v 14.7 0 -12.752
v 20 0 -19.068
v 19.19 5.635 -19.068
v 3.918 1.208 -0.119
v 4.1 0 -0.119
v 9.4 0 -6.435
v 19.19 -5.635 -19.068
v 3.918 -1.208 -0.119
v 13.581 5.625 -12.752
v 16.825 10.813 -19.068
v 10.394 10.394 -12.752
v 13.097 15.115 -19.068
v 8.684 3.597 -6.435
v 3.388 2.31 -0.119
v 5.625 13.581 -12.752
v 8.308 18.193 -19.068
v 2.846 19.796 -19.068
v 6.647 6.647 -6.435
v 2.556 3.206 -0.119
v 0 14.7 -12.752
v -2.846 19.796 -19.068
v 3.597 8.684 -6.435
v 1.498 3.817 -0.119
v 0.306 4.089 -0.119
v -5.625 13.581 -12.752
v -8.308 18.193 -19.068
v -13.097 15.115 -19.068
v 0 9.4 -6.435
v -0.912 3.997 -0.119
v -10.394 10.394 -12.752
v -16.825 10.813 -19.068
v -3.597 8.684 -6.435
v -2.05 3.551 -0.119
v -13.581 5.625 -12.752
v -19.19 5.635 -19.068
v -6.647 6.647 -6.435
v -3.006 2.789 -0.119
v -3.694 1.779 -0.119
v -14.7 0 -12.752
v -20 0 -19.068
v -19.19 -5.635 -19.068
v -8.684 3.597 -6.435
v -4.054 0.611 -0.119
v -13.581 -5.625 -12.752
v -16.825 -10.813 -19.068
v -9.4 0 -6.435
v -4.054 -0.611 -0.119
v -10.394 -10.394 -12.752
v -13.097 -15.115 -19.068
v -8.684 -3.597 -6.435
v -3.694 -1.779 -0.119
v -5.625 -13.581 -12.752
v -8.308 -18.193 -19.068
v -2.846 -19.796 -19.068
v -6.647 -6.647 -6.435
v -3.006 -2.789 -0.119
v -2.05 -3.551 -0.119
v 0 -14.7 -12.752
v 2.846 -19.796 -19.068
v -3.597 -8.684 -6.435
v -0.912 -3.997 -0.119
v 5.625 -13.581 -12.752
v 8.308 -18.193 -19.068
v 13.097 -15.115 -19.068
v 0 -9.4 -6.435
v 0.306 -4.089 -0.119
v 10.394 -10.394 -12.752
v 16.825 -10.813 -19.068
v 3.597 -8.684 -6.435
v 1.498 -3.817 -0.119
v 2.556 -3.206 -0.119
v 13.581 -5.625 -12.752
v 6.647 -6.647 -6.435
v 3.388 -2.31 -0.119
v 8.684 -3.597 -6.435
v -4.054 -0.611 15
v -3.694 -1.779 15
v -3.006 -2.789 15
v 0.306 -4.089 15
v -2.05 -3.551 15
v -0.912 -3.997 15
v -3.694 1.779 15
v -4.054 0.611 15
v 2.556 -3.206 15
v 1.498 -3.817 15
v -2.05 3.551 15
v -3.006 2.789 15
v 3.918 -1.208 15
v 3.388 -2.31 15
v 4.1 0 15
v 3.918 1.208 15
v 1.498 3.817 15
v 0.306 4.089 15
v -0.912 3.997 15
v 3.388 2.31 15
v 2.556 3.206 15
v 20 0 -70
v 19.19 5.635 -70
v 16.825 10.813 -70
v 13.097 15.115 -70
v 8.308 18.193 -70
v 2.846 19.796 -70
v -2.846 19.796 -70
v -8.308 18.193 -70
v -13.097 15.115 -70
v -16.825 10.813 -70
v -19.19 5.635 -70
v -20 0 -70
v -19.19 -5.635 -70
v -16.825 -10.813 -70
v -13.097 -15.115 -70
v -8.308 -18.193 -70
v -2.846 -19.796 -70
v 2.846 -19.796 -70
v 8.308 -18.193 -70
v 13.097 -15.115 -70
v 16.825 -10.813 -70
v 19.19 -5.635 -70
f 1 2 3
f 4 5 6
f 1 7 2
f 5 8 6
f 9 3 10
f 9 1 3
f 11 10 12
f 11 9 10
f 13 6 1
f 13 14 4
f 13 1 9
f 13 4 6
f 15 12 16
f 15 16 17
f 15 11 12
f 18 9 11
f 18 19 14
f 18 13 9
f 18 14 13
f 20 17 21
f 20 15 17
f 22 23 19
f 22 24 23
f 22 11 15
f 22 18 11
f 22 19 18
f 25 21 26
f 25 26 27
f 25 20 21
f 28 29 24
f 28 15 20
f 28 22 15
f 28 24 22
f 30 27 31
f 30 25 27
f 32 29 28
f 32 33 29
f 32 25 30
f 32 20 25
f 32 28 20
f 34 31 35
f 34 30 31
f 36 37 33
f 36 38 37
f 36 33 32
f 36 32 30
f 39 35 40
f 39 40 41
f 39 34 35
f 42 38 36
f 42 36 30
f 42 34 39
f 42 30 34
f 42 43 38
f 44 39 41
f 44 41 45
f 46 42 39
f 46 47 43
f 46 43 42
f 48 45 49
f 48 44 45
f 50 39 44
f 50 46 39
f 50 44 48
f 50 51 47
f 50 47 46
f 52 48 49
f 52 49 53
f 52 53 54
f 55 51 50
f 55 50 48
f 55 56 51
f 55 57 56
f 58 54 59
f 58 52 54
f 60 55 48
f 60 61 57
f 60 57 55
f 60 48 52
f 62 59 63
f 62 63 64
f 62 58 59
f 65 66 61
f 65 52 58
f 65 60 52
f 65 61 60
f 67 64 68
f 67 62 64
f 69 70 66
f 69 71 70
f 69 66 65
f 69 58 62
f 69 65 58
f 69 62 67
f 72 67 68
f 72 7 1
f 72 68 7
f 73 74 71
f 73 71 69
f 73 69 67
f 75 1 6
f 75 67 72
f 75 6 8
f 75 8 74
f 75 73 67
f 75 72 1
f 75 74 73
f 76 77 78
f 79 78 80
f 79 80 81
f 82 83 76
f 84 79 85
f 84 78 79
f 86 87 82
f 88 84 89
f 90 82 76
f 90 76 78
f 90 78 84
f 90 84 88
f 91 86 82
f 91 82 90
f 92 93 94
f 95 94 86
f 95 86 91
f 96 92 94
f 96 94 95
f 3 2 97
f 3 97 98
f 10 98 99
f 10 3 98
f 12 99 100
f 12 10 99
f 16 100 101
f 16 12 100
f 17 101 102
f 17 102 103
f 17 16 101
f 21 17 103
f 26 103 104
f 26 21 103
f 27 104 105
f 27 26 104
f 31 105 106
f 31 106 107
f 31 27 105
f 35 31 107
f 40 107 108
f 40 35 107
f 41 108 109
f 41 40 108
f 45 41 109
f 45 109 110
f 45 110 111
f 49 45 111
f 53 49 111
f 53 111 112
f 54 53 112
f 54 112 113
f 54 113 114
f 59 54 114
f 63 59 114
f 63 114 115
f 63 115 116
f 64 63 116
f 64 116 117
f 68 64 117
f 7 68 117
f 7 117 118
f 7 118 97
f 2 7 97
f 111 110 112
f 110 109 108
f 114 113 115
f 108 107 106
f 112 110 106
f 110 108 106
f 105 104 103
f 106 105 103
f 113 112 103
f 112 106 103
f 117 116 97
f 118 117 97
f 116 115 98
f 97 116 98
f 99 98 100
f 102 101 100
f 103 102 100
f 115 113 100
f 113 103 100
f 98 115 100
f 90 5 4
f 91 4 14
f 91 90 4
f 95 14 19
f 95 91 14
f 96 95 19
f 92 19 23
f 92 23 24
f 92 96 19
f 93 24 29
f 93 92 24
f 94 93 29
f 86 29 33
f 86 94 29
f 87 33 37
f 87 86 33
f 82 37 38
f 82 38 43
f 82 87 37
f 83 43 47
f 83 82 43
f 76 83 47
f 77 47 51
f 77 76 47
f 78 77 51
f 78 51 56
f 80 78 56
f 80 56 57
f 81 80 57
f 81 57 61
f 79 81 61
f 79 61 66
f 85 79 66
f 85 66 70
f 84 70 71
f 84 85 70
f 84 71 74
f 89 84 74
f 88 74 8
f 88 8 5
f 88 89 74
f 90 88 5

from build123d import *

# Parameters (mm, degrees)
F0_R        = 4.1
F1_DEPTH    = 15
F2_R        = 20
F3_DEPTH    = 70
F4_S5_R     = 4.1
F4_T6_DEPTH = 31


# Not quite as in the source:
# - a fillet or chamfer that OpenCascade refuses, or shapes differently, is made with other operations: its cross-section is extruded or revolved along the edge and cut away or added


with BuildPart() as f1:
    # F0 (on Top) → F1 (new body)
    with BuildSketch(Plane.XY):
        Circle(F0_R)
    extrude(amount=F1_DEPTH)

    # F2 (on Top) → F3 (join)
    with BuildSketch(Plane.XY):
        Circle(F2_R)
    extrude(amount=-F3_DEPTH)

    # F4: chamfer of 16 x 19.0680574815 on 1 edges, made by hand


with BuildPart() as f4_tool2:
    # F4_s3 → F4_t4 (revolve)
    with BuildSketch(Plane.XZ):
        Polygon((20, -19.0680574815), (4, 0), (20, 0), align=None)
    revolve(axis=Axis((0, 0, 0), (0, 0, 1)))

    # F4_s5 → F4_t6 (cut, symmetric)
    with BuildSketch(Plane.XY.offset(-9.5)):
        Circle(F4_S5_R)
    extrude(amount=F4_T6_DEPTH, both=True, mode=Mode.SUBTRACT)


with BuildPart() as f1_1:
    add(f1.part)

    # F4_t1: cut F4_tool2
    add(f4_tool2.part, mode=Mode.SUBTRACT)


solid = f1_1.part
